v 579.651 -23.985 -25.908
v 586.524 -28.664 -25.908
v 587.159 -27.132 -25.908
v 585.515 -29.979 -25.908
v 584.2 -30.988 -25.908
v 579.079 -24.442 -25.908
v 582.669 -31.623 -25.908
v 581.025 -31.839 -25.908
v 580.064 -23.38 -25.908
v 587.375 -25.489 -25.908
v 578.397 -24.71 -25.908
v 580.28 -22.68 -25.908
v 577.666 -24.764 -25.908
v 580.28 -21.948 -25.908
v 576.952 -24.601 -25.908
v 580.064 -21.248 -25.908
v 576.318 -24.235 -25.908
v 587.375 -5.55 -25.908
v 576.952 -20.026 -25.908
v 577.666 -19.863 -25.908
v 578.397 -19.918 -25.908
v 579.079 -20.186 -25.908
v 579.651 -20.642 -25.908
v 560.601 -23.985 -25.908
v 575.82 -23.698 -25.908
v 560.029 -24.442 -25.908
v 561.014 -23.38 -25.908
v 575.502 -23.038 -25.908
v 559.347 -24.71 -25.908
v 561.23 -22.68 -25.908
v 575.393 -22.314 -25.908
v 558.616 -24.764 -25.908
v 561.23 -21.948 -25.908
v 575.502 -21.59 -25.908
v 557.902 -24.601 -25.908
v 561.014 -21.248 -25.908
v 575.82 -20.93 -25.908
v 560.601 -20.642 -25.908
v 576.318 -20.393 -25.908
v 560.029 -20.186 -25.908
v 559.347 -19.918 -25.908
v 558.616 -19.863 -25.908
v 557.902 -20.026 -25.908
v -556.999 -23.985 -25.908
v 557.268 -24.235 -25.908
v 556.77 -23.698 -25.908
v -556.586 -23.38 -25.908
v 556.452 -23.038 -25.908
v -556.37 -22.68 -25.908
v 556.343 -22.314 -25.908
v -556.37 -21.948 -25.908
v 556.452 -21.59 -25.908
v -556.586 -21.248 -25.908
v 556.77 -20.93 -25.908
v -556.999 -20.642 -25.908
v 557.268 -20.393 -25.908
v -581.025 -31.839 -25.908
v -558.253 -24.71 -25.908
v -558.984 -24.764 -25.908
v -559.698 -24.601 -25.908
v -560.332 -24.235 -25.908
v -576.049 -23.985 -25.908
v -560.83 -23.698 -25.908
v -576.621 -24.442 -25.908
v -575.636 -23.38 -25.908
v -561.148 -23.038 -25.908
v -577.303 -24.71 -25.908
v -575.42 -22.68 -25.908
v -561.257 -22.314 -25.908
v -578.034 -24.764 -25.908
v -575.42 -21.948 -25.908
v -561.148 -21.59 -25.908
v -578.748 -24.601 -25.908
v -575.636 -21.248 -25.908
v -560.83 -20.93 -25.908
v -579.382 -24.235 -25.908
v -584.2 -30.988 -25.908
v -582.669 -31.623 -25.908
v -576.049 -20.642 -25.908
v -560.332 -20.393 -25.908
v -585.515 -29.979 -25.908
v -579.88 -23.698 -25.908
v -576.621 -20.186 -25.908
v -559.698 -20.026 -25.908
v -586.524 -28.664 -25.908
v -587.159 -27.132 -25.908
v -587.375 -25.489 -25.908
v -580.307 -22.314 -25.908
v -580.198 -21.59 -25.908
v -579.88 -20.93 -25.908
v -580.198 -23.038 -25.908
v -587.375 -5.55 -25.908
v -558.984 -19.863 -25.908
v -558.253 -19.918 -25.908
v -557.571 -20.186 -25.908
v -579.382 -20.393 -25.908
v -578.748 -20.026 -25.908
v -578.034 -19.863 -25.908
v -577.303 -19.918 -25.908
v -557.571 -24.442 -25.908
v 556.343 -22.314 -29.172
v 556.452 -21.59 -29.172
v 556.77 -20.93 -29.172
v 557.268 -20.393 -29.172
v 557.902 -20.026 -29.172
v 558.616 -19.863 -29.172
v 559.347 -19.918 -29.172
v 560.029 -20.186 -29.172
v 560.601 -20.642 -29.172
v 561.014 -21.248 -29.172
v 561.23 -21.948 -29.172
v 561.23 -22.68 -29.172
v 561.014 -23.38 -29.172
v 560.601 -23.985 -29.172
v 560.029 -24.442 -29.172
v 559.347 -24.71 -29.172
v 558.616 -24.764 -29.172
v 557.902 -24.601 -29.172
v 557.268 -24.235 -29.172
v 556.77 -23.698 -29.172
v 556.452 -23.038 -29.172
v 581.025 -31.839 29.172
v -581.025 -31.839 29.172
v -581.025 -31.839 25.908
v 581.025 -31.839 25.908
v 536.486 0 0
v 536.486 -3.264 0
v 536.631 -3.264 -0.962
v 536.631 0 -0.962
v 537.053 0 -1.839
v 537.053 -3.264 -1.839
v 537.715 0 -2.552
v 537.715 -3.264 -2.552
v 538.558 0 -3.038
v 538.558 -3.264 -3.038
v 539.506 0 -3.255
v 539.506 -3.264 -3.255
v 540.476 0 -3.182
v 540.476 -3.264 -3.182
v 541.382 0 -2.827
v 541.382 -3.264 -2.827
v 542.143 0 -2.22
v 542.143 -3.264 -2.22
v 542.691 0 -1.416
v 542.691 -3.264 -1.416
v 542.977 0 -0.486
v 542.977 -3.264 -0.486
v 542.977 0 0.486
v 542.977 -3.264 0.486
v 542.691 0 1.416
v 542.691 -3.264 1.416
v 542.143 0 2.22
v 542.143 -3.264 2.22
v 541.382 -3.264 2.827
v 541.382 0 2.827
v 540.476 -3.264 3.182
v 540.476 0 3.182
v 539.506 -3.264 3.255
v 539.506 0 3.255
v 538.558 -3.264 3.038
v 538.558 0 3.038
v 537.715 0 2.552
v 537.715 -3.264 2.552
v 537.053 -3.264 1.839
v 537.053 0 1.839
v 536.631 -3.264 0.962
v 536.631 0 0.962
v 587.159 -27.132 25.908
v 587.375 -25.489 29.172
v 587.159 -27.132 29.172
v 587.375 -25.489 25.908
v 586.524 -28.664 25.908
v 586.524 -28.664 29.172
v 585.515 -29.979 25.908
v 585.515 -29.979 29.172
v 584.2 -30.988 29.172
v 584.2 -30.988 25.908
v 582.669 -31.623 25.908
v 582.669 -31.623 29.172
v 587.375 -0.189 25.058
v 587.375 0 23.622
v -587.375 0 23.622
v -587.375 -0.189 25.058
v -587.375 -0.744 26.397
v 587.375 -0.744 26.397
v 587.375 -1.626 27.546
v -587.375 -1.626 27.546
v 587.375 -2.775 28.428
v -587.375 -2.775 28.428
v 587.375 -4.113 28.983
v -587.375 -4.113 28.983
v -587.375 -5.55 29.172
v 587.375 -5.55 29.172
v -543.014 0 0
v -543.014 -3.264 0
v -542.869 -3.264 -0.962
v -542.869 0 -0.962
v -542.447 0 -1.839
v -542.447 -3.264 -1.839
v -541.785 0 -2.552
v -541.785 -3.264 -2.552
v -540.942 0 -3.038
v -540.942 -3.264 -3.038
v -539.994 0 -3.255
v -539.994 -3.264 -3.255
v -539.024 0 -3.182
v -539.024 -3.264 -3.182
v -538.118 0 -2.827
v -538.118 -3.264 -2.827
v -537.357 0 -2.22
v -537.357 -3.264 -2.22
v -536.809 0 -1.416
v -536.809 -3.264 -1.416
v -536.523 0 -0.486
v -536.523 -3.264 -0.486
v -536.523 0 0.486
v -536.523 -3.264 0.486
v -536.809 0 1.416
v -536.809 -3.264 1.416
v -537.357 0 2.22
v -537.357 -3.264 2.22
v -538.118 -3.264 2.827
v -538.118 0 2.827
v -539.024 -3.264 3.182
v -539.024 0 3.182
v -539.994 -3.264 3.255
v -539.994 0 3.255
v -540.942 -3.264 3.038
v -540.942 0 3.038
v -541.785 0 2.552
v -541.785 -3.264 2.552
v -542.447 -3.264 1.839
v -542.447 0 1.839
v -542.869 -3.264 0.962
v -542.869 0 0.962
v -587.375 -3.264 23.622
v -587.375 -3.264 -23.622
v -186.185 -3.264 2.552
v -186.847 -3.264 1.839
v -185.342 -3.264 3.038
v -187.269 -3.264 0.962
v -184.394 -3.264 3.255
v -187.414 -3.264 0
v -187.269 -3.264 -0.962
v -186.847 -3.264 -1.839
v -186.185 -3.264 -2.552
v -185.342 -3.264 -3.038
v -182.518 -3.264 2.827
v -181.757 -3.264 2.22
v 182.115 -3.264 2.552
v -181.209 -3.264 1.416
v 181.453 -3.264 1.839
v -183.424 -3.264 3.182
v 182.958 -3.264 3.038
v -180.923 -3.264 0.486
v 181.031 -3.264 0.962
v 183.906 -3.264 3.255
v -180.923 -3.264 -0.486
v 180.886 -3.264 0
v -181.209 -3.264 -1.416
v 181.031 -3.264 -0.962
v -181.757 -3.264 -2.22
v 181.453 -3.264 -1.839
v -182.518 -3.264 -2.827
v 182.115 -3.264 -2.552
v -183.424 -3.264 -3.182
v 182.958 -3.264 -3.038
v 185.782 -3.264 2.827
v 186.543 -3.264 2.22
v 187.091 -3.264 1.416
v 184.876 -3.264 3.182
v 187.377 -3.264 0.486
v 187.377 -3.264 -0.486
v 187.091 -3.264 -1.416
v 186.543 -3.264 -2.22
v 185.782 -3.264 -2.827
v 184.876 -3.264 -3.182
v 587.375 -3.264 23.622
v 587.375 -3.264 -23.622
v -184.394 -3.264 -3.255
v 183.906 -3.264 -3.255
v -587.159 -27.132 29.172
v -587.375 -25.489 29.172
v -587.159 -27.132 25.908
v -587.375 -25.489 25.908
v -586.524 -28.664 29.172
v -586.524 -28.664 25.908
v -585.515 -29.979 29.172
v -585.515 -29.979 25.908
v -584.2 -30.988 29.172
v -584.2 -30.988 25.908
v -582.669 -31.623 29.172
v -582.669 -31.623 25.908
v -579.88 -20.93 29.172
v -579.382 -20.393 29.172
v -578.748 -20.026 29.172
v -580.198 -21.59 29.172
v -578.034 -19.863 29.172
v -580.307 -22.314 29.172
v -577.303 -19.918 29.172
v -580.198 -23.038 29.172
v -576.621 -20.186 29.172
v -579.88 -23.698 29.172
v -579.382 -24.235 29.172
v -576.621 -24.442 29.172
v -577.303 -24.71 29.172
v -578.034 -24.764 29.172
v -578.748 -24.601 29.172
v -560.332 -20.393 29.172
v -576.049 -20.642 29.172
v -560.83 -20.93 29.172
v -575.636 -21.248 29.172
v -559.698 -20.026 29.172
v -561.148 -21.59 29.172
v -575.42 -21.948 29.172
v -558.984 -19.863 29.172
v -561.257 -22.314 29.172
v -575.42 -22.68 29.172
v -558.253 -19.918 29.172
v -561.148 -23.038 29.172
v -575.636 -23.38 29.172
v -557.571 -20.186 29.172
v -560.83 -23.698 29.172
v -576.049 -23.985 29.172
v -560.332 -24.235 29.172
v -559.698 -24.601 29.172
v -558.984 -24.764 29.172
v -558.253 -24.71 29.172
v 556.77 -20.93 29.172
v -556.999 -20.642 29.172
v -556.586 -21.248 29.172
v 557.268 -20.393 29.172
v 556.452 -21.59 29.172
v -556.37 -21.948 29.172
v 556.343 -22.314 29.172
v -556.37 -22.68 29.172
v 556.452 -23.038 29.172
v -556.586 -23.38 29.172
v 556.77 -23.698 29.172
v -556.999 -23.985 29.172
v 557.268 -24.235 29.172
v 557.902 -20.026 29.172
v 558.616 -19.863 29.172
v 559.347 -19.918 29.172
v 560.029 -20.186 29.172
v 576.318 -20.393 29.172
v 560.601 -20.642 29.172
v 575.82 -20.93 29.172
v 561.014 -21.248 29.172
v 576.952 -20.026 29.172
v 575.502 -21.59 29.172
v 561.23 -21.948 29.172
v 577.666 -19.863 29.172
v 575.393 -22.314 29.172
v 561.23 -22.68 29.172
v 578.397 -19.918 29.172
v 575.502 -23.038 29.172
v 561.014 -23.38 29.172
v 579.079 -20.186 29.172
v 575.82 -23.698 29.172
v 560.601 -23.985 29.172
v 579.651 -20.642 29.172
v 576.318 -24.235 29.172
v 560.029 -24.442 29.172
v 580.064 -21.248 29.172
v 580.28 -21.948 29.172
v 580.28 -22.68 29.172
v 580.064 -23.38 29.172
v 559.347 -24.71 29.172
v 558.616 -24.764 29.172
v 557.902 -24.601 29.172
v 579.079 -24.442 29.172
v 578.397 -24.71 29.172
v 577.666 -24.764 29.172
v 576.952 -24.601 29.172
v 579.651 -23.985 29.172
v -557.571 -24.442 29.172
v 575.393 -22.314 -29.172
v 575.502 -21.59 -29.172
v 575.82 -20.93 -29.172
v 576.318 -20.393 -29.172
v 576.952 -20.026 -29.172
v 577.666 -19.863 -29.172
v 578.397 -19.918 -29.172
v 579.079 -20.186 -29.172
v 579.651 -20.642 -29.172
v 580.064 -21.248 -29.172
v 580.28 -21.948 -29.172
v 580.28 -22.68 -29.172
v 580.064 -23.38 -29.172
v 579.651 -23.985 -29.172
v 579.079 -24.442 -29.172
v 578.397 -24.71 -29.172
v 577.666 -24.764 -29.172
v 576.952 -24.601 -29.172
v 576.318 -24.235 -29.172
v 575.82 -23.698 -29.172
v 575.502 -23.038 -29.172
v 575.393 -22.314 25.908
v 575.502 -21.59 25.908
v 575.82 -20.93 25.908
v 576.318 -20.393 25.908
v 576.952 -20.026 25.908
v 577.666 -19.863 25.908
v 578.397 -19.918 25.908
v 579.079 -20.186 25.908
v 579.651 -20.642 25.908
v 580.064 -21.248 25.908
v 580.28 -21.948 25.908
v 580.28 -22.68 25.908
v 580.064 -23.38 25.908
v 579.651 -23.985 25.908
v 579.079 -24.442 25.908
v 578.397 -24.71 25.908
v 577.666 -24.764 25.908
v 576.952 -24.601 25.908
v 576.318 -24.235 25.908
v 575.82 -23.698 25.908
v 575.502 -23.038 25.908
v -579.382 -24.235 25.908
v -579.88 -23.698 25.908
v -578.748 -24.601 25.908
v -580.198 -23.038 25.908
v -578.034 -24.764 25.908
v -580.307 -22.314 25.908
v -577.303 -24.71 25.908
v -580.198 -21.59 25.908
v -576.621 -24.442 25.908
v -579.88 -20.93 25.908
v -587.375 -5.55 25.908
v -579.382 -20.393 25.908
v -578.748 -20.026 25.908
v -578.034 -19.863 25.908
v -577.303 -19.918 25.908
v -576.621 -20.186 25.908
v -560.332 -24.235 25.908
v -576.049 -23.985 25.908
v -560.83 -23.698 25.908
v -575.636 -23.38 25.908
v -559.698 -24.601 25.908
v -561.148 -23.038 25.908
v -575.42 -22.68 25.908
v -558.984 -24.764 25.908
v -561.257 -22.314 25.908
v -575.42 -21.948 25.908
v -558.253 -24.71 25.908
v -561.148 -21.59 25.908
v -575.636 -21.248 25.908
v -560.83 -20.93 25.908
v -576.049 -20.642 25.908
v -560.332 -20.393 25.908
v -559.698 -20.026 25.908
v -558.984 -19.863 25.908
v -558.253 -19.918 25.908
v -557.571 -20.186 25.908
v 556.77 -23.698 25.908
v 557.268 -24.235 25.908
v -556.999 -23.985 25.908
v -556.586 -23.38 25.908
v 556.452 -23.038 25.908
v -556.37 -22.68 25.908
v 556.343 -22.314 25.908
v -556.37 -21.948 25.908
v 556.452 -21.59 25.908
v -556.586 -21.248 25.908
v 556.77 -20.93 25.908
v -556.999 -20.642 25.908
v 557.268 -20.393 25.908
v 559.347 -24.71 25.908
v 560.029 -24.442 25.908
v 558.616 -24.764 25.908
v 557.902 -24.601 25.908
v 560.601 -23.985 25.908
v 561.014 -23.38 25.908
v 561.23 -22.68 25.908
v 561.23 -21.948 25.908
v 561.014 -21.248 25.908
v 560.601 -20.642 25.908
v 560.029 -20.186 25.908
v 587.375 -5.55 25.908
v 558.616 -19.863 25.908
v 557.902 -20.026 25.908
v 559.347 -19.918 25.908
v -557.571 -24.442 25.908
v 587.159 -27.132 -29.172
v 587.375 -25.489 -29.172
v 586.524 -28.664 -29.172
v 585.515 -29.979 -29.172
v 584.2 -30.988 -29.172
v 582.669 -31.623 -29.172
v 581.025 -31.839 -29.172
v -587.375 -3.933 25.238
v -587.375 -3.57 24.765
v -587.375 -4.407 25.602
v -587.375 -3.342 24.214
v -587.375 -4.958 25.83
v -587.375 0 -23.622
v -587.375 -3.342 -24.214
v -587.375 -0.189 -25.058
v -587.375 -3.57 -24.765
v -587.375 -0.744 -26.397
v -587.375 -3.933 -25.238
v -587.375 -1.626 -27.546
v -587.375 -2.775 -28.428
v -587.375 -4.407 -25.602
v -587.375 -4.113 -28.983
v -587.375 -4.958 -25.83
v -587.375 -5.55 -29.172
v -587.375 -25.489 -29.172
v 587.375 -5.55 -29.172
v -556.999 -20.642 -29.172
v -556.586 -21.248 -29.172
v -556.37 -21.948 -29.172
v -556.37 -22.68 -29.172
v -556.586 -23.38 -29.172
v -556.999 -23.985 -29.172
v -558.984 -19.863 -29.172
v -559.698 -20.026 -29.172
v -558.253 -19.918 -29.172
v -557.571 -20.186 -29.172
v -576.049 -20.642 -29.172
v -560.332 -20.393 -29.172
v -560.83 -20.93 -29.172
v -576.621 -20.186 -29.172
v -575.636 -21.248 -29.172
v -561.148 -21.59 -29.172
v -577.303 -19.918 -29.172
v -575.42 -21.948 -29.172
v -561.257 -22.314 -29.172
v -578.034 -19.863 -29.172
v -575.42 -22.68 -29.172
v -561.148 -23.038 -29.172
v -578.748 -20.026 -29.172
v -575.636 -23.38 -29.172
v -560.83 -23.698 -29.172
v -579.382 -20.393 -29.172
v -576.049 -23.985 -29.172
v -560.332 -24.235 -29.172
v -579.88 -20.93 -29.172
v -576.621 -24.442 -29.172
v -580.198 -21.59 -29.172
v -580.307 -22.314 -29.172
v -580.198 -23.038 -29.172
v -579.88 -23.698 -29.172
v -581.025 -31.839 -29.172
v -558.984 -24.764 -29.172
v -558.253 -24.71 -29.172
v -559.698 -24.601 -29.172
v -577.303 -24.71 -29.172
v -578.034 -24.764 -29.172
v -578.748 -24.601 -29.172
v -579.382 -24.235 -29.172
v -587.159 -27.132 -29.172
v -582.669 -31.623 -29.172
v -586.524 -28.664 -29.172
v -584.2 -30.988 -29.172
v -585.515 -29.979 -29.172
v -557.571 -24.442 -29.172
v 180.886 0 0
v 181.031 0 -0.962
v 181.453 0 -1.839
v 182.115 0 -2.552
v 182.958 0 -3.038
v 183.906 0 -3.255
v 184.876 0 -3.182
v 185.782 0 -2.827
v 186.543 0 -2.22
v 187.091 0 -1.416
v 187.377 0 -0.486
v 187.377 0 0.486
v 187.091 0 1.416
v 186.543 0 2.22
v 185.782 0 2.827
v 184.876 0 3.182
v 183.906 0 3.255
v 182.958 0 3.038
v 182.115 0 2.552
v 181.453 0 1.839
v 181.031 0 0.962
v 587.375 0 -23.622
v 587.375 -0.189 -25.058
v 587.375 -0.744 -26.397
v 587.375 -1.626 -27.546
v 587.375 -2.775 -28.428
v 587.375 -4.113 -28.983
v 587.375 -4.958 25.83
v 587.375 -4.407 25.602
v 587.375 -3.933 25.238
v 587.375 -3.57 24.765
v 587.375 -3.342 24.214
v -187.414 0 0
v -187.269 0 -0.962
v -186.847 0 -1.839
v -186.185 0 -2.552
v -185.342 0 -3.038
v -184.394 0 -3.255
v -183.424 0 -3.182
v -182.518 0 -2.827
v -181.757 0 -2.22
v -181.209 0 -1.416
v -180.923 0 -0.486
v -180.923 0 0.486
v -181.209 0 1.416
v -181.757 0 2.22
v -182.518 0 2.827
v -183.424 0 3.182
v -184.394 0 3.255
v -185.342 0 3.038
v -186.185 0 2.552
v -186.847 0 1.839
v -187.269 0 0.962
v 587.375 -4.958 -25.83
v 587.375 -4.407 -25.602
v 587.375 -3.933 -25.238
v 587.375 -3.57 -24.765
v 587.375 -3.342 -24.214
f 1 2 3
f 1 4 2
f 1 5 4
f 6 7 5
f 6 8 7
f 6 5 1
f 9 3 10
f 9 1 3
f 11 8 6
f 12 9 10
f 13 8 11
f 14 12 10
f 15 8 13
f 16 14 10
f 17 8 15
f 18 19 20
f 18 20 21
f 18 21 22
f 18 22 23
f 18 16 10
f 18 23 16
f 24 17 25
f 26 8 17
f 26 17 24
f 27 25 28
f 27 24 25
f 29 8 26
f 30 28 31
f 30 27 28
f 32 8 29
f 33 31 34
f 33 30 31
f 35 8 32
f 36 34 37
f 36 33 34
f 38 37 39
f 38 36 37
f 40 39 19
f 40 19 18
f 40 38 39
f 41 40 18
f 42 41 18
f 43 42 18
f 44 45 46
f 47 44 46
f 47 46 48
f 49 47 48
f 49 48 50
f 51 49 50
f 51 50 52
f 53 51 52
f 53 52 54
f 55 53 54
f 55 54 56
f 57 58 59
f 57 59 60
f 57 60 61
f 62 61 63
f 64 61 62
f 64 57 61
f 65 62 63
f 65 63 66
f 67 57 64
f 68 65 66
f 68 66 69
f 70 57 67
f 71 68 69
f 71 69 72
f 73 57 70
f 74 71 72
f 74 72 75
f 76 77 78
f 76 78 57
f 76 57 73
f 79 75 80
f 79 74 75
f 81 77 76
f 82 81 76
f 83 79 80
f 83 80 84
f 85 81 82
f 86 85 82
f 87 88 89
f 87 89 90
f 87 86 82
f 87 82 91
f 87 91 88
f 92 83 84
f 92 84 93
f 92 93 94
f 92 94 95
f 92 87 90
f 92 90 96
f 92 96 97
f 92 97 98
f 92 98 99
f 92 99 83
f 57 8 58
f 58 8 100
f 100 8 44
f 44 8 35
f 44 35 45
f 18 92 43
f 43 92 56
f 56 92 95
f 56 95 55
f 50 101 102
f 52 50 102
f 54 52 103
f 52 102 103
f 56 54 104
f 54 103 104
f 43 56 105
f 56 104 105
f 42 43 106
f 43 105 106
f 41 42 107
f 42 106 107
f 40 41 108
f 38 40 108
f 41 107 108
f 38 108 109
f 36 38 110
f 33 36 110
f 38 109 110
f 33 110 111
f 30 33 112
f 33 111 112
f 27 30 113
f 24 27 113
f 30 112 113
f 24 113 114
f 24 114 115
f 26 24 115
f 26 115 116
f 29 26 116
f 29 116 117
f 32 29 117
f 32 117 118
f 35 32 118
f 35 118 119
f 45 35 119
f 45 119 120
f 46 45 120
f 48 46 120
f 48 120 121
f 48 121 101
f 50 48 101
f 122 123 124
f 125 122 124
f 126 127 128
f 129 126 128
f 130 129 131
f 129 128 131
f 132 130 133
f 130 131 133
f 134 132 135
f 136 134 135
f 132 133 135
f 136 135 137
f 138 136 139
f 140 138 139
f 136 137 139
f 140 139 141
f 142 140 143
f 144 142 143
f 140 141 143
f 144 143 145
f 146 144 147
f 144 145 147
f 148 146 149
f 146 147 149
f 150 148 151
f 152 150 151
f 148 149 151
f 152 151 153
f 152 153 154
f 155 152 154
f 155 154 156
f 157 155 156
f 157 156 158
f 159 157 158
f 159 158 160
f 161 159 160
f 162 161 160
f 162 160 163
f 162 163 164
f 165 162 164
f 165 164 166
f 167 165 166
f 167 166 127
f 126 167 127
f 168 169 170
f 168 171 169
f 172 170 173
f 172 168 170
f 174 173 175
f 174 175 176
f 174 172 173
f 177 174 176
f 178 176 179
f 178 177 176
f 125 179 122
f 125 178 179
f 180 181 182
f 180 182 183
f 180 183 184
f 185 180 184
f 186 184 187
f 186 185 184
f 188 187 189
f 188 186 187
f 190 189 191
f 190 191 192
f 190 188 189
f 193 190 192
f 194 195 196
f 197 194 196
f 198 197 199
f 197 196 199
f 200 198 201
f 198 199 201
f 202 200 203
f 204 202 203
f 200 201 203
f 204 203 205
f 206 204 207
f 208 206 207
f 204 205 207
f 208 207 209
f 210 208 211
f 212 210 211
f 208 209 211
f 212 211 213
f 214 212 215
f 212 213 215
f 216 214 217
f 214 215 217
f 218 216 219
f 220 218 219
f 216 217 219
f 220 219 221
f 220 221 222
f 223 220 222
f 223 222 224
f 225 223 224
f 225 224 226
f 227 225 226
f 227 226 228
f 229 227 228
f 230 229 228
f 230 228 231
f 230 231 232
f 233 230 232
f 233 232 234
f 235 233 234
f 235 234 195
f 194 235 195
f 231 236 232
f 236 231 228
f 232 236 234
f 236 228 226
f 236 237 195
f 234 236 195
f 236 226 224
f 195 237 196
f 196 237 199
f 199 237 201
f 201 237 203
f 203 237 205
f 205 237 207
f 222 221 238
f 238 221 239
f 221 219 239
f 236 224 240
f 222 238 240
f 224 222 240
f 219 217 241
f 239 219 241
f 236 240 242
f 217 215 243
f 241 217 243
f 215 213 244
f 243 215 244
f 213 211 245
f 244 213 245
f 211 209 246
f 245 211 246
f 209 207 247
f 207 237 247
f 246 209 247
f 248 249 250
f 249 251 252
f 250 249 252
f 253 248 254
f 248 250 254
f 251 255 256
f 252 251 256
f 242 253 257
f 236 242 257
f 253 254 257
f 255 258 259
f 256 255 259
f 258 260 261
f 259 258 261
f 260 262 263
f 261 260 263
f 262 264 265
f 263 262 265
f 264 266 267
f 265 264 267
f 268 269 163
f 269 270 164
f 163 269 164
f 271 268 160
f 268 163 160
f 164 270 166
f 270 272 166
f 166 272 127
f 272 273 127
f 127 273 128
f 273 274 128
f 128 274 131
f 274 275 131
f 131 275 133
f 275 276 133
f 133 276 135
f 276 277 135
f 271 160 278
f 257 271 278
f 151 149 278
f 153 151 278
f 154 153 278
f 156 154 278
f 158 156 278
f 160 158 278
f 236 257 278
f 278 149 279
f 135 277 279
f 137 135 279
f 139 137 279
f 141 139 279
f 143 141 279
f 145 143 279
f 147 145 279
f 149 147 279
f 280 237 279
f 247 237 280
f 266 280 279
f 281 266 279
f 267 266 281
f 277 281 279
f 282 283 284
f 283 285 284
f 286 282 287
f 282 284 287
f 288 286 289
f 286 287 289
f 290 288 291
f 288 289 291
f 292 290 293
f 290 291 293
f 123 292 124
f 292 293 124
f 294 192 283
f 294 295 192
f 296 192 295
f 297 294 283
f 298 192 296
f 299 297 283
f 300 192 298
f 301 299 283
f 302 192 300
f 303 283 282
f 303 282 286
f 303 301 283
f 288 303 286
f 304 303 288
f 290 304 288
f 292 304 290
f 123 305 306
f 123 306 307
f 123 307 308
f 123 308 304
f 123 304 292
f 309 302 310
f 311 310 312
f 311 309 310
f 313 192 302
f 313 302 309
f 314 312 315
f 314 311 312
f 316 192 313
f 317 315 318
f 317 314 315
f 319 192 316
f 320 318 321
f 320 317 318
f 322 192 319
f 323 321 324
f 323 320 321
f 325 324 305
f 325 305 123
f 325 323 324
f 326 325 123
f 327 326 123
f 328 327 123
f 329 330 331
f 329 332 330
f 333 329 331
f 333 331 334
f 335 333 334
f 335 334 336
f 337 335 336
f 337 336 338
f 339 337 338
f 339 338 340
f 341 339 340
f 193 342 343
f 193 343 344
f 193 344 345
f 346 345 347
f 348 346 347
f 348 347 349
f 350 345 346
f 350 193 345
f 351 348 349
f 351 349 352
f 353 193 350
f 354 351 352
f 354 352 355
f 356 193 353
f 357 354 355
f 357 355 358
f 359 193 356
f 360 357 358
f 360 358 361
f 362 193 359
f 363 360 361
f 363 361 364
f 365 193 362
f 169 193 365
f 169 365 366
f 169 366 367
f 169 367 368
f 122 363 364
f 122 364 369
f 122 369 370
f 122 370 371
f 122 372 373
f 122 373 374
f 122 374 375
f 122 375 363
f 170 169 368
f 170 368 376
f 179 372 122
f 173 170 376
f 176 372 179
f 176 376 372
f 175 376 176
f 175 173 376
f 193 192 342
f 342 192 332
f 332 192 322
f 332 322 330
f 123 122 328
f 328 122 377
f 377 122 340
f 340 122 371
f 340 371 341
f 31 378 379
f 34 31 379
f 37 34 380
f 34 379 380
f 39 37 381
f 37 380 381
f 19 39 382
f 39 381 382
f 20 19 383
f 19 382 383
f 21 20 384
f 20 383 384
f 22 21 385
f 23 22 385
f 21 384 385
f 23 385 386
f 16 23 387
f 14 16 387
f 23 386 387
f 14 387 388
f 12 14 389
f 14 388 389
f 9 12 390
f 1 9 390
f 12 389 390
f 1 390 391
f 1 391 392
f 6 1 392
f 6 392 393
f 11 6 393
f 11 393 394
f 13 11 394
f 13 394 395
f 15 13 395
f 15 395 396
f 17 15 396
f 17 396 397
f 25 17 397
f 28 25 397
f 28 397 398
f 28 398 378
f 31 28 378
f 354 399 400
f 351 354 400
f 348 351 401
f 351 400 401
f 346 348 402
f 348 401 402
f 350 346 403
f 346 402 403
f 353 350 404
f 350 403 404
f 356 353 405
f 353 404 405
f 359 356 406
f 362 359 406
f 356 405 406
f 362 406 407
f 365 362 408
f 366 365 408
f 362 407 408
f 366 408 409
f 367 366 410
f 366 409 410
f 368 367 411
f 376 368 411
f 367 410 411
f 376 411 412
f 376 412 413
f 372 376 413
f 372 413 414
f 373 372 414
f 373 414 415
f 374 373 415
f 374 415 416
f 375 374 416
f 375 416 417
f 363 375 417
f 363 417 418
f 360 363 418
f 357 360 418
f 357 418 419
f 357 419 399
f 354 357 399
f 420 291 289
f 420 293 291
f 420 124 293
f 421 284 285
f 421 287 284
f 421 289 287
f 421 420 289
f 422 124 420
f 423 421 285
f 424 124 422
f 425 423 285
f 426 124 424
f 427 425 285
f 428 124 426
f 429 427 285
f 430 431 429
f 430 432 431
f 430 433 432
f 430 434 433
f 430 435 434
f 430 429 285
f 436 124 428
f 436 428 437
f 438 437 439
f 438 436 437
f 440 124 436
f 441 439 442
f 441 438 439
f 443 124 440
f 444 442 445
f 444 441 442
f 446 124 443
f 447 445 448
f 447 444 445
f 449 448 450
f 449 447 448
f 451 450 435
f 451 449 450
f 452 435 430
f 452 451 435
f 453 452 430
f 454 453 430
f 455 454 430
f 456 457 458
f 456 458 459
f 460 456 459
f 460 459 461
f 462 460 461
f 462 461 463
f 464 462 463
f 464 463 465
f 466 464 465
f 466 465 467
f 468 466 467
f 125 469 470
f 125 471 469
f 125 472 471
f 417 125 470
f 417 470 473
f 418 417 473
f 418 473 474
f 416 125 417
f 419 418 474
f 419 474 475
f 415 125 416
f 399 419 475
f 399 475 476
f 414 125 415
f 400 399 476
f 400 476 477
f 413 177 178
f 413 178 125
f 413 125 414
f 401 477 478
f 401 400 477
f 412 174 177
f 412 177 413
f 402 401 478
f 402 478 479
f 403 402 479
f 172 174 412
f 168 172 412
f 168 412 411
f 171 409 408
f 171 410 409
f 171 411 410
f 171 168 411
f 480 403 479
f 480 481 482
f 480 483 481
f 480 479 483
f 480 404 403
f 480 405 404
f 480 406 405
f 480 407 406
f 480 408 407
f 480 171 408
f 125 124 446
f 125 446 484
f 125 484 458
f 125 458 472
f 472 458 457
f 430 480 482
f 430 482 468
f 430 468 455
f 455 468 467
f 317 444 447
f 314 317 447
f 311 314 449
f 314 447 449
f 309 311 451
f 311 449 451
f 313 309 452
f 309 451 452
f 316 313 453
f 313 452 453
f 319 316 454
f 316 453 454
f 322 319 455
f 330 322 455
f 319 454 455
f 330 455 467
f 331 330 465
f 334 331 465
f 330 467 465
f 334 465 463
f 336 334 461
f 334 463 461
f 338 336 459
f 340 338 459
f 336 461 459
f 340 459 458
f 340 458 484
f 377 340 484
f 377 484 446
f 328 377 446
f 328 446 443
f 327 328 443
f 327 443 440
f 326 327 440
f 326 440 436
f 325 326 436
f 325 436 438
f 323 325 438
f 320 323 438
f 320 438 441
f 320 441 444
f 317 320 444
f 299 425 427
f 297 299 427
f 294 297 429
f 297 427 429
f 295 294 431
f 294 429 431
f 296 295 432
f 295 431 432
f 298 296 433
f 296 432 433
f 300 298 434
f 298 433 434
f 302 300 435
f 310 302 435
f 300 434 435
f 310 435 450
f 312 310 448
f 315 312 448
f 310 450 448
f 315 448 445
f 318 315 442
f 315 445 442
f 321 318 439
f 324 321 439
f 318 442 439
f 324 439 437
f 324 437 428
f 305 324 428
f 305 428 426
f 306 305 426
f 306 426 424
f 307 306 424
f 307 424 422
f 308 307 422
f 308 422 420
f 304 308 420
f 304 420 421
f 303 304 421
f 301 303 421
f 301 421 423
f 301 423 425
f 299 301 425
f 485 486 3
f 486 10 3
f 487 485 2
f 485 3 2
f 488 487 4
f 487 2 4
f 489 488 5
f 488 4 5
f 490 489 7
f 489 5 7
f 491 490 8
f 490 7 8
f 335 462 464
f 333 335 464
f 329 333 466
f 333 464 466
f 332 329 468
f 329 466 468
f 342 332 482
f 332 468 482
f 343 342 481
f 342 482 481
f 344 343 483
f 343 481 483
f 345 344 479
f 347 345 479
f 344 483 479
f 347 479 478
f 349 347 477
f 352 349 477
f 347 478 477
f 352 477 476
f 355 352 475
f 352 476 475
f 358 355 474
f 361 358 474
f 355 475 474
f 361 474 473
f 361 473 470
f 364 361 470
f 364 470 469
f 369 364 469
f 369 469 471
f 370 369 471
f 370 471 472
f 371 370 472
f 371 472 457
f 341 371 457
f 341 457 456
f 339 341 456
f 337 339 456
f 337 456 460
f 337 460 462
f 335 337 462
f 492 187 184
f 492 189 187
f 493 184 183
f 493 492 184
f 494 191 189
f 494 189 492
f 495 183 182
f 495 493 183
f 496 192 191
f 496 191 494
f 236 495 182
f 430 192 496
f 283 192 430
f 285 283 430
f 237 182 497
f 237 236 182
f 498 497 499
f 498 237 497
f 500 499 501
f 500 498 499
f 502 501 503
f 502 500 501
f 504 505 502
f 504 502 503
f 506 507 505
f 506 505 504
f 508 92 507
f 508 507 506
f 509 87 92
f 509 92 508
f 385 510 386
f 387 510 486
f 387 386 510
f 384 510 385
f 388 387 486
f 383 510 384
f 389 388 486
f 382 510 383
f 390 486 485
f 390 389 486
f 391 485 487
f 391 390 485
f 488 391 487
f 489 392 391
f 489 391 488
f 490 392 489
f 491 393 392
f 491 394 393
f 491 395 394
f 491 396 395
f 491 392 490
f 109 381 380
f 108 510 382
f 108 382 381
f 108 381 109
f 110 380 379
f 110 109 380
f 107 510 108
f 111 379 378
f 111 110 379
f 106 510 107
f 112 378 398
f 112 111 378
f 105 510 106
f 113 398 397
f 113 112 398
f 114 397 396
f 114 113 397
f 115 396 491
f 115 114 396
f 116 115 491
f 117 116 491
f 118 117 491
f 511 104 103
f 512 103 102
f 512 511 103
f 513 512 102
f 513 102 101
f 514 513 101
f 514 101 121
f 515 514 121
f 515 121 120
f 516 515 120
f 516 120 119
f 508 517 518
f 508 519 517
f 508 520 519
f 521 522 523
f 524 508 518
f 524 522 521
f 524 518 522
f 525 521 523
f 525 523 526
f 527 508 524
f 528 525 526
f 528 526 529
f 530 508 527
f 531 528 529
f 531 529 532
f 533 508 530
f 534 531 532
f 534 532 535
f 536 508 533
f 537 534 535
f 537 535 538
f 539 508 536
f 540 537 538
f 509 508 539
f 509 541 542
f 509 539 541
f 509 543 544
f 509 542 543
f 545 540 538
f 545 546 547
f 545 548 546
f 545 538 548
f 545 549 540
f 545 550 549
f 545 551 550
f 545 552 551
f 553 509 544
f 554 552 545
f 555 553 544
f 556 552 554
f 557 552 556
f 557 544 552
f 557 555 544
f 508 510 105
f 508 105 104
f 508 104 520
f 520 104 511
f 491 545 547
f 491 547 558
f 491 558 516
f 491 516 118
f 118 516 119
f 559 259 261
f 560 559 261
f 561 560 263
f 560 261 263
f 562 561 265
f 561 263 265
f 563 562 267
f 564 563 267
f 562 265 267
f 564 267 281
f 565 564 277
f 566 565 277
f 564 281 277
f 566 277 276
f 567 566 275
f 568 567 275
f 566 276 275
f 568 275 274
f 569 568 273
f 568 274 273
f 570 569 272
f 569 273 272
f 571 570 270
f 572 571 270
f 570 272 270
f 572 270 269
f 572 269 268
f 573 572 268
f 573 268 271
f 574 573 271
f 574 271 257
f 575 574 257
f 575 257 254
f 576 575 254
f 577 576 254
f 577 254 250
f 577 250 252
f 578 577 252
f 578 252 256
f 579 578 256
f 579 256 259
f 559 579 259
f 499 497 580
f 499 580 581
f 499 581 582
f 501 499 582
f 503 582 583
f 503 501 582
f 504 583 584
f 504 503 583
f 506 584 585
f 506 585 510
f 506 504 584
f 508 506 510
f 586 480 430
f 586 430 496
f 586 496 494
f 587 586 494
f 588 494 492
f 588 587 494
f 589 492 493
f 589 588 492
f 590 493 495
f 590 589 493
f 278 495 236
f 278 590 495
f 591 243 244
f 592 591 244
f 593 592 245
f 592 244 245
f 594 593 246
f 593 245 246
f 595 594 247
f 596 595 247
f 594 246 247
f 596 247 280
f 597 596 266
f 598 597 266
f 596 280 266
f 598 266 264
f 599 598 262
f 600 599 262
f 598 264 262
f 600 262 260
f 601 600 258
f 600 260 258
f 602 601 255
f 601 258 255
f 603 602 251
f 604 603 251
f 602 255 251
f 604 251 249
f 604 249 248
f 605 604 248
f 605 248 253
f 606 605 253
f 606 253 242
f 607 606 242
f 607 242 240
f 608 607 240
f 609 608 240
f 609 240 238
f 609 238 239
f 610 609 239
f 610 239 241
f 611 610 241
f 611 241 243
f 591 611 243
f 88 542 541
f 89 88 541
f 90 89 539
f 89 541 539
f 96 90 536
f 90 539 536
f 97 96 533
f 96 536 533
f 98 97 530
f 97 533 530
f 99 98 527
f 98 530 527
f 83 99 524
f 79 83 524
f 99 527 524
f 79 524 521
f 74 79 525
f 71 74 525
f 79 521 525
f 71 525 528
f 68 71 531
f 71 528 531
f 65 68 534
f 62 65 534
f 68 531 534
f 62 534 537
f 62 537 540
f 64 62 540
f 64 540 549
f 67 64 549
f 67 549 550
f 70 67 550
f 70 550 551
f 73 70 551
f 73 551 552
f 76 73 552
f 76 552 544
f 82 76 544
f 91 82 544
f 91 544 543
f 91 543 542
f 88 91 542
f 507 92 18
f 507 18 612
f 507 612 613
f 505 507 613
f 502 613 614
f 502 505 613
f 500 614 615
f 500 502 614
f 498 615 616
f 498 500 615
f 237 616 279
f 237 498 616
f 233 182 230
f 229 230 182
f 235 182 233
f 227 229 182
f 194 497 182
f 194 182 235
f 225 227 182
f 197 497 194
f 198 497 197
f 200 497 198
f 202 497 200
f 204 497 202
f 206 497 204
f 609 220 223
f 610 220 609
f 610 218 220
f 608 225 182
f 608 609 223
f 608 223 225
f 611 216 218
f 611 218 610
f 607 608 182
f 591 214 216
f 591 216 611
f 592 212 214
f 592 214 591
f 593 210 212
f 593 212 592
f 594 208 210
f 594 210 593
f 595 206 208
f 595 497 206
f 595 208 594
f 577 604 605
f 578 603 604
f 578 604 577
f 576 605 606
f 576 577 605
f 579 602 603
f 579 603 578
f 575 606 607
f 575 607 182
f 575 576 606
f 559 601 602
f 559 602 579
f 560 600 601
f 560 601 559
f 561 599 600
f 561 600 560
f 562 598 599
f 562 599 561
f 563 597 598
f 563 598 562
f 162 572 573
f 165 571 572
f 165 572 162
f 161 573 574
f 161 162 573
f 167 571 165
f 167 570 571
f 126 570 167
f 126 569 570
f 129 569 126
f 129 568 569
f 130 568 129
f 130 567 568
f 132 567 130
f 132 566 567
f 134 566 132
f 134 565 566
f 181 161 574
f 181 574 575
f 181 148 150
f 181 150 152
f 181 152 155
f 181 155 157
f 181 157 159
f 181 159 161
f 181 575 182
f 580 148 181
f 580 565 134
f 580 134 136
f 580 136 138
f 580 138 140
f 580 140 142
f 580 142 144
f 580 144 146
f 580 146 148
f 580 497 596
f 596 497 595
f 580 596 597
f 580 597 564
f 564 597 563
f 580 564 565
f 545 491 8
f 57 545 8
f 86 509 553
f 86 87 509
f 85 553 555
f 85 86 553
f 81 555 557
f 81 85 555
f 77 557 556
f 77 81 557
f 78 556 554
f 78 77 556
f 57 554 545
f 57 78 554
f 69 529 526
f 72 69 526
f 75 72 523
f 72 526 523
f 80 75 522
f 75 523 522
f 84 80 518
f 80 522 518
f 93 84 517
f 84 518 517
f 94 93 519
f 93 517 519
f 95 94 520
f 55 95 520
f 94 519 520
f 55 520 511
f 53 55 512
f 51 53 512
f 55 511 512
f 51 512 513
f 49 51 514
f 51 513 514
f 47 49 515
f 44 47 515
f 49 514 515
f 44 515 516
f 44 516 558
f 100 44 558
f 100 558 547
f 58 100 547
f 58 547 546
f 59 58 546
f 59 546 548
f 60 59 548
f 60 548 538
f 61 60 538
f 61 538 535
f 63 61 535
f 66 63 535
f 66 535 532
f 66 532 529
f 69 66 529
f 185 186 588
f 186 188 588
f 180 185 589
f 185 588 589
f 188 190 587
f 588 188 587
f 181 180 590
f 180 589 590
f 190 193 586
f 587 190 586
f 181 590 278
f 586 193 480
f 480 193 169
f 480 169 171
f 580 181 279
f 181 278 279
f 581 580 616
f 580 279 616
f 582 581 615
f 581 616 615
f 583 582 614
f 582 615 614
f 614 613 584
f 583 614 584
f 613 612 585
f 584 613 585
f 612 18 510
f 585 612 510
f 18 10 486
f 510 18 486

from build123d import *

# Parameters (mm, degrees)
SKETCH1_W                      = 1174.75
SKETCH1_H                      = 51.816
BASE_FLANGE1_DEPTH             = 3.2639
EDGE_FLANGE1_STRIP_W           = 17.6276
EDGE_FLANGE1_STRIP_H           = 3.2639
EDGE_FLANGE1_STRIP_CUT_DEPTH   = 1174.75
EDGE_FLANGE1_STRIP_2_W         = 17.6276
EDGE_FLANGE1_STRIP_2_H         = 3.2639
EDGE_FLANGE1_STRIP_CUT_2_DEPTH = 1174.75
EDGE_FLANGE1_DEPTH             = 1174.75
EDGE_FLANGE1_BEND_DEPTH        = 1174.75
F_10_0_1935_DIAMETER_HOLE2_D   = 4.9149
FILLET2_R                      = 6.35
F_1_4_CLEARANCE_HOLE1_D        = 6.5278


# Sheet-metal steps are written as plain solids
with BuildPart() as part:
    # Sketch1 → Base-Flange1 (new body)
    with BuildSketch(Plane(origin=(0, 0, 0), x_dir=(1, 0, 0), z_dir=(0, 1, 0))):
        Rectangle(SKETCH1_W, SKETCH1_H)
    extrude(amount=-BASE_FLANGE1_DEPTH)

    # Edge-Flange1 strip (across the edge) → Edge-Flange1 strip cut (cut)
    with BuildSketch(Plane(origin=(587.375, -3.2639, 25.908), x_dir=(0, 0, -1), z_dir=(-1, 0, 0))):
        with Locations((-6.5278, -1.63195)):
            Rectangle(EDGE_FLANGE1_STRIP_W, EDGE_FLANGE1_STRIP_H)
    extrude(amount=EDGE_FLANGE1_STRIP_CUT_DEPTH, mode=Mode.SUBTRACT)

    # Edge-Flange1 strip 2 (across the edge) → Edge-Flange1 strip cut 2 (cut)
    with BuildSketch(Plane(origin=(-587.375, -3.2639, -25.908), x_dir=(0, 0, 1), z_dir=(1, 0, 0))):
        with Locations((-6.5278, -1.63195)):
            Rectangle(EDGE_FLANGE1_STRIP_2_W, EDGE_FLANGE1_STRIP_2_H)
    extrude(amount=EDGE_FLANGE1_STRIP_CUT_2_DEPTH, mode=Mode.SUBTRACT)

    # Edge-Flange1 section (across the edge) → Edge-Flange1 (add)
    with BuildSketch(Plane(origin=(587.375, -3.2639, 25.908), x_dir=(0, 0, -1), z_dir=(-1, 0, 0))):
        with BuildLine():
            Line((-3.2639, 2.286), (-3.2639, 28.575))
            Line((-3.2639, 28.575), (0, 28.575))
            Line((0, 28.575), (0, 2.286))
            ThreePointArc((0, 2.286), (0.669553898, 0.669553898), (2.286, 0))
            Line((2.286, 0), (2.286, -3.2639))
            ThreePointArc((2.286, -3.2639), (-1.638371925, -1.638371925), (-3.2639, 2.286))
        make_face()
    extrude(amount=EDGE_FLANGE1_DEPTH)

    # Edge-Flange1 section 2 (across the edge) → Edge-Flange1 bend (add)
    with BuildSketch(Plane(origin=(-587.375, -3.2639, -25.908), x_dir=(0, 0, 1), z_dir=(1, 0, 0))):
        with BuildLine():
            Line((-3.2639, 2.286), (-3.2639, 28.575))
            Line((-3.2639, 28.575), (0, 28.575))
            Line((0, 28.575), (0, 2.286))
            ThreePointArc((0, 2.286), (0.669553898, 0.669553898), (2.286, 0))
            Line((2.286, 0), (2.286, -3.2639))
            ThreePointArc((2.286, -3.2639), (-1.638371925, -1.638371925), (-3.2639, 2.286))
        make_face()
    extrude(amount=EDGE_FLANGE1_BEND_DEPTH)

    # #10 (0.1935) Diameter Hole2 (through all)
    with Locations(Plane.XY.offset(29.1719)):
        with Locations((577.85, -22.3139), (558.8, -22.3139), (-558.8, -22.3139), (-577.85, -22.3139)):
            Hole(F_10_0_1935_DIAMETER_HOLE2_D / 2)

    # Fillet2
    fillet2_edges = [part.edges().sort_by_distance(p)[0] for p in [
        (587.375, -31.8389, 27.53995),
        (-587.375, -31.8389, 27.53995),
        (-587.375, -31.8389, -27.53995),
        (587.375, -31.8389, -27.53995),
    ]]
    fillet(fillet2_edges, radius=FILLET2_R)

    # 1/4 Clearance Hole1 (through all)
    with Locations(Plane(origin=(0, 0, 0), x_dir=(1, 0, 0), z_dir=(0, 1, 0))):
        with Locations((539.75, 0), (184.15, 0), (-184.15, 0), (-539.75, 0)):
            Hole(F_1_4_CLEARANCE_HOLE1_D / 2)


solid = part.part
